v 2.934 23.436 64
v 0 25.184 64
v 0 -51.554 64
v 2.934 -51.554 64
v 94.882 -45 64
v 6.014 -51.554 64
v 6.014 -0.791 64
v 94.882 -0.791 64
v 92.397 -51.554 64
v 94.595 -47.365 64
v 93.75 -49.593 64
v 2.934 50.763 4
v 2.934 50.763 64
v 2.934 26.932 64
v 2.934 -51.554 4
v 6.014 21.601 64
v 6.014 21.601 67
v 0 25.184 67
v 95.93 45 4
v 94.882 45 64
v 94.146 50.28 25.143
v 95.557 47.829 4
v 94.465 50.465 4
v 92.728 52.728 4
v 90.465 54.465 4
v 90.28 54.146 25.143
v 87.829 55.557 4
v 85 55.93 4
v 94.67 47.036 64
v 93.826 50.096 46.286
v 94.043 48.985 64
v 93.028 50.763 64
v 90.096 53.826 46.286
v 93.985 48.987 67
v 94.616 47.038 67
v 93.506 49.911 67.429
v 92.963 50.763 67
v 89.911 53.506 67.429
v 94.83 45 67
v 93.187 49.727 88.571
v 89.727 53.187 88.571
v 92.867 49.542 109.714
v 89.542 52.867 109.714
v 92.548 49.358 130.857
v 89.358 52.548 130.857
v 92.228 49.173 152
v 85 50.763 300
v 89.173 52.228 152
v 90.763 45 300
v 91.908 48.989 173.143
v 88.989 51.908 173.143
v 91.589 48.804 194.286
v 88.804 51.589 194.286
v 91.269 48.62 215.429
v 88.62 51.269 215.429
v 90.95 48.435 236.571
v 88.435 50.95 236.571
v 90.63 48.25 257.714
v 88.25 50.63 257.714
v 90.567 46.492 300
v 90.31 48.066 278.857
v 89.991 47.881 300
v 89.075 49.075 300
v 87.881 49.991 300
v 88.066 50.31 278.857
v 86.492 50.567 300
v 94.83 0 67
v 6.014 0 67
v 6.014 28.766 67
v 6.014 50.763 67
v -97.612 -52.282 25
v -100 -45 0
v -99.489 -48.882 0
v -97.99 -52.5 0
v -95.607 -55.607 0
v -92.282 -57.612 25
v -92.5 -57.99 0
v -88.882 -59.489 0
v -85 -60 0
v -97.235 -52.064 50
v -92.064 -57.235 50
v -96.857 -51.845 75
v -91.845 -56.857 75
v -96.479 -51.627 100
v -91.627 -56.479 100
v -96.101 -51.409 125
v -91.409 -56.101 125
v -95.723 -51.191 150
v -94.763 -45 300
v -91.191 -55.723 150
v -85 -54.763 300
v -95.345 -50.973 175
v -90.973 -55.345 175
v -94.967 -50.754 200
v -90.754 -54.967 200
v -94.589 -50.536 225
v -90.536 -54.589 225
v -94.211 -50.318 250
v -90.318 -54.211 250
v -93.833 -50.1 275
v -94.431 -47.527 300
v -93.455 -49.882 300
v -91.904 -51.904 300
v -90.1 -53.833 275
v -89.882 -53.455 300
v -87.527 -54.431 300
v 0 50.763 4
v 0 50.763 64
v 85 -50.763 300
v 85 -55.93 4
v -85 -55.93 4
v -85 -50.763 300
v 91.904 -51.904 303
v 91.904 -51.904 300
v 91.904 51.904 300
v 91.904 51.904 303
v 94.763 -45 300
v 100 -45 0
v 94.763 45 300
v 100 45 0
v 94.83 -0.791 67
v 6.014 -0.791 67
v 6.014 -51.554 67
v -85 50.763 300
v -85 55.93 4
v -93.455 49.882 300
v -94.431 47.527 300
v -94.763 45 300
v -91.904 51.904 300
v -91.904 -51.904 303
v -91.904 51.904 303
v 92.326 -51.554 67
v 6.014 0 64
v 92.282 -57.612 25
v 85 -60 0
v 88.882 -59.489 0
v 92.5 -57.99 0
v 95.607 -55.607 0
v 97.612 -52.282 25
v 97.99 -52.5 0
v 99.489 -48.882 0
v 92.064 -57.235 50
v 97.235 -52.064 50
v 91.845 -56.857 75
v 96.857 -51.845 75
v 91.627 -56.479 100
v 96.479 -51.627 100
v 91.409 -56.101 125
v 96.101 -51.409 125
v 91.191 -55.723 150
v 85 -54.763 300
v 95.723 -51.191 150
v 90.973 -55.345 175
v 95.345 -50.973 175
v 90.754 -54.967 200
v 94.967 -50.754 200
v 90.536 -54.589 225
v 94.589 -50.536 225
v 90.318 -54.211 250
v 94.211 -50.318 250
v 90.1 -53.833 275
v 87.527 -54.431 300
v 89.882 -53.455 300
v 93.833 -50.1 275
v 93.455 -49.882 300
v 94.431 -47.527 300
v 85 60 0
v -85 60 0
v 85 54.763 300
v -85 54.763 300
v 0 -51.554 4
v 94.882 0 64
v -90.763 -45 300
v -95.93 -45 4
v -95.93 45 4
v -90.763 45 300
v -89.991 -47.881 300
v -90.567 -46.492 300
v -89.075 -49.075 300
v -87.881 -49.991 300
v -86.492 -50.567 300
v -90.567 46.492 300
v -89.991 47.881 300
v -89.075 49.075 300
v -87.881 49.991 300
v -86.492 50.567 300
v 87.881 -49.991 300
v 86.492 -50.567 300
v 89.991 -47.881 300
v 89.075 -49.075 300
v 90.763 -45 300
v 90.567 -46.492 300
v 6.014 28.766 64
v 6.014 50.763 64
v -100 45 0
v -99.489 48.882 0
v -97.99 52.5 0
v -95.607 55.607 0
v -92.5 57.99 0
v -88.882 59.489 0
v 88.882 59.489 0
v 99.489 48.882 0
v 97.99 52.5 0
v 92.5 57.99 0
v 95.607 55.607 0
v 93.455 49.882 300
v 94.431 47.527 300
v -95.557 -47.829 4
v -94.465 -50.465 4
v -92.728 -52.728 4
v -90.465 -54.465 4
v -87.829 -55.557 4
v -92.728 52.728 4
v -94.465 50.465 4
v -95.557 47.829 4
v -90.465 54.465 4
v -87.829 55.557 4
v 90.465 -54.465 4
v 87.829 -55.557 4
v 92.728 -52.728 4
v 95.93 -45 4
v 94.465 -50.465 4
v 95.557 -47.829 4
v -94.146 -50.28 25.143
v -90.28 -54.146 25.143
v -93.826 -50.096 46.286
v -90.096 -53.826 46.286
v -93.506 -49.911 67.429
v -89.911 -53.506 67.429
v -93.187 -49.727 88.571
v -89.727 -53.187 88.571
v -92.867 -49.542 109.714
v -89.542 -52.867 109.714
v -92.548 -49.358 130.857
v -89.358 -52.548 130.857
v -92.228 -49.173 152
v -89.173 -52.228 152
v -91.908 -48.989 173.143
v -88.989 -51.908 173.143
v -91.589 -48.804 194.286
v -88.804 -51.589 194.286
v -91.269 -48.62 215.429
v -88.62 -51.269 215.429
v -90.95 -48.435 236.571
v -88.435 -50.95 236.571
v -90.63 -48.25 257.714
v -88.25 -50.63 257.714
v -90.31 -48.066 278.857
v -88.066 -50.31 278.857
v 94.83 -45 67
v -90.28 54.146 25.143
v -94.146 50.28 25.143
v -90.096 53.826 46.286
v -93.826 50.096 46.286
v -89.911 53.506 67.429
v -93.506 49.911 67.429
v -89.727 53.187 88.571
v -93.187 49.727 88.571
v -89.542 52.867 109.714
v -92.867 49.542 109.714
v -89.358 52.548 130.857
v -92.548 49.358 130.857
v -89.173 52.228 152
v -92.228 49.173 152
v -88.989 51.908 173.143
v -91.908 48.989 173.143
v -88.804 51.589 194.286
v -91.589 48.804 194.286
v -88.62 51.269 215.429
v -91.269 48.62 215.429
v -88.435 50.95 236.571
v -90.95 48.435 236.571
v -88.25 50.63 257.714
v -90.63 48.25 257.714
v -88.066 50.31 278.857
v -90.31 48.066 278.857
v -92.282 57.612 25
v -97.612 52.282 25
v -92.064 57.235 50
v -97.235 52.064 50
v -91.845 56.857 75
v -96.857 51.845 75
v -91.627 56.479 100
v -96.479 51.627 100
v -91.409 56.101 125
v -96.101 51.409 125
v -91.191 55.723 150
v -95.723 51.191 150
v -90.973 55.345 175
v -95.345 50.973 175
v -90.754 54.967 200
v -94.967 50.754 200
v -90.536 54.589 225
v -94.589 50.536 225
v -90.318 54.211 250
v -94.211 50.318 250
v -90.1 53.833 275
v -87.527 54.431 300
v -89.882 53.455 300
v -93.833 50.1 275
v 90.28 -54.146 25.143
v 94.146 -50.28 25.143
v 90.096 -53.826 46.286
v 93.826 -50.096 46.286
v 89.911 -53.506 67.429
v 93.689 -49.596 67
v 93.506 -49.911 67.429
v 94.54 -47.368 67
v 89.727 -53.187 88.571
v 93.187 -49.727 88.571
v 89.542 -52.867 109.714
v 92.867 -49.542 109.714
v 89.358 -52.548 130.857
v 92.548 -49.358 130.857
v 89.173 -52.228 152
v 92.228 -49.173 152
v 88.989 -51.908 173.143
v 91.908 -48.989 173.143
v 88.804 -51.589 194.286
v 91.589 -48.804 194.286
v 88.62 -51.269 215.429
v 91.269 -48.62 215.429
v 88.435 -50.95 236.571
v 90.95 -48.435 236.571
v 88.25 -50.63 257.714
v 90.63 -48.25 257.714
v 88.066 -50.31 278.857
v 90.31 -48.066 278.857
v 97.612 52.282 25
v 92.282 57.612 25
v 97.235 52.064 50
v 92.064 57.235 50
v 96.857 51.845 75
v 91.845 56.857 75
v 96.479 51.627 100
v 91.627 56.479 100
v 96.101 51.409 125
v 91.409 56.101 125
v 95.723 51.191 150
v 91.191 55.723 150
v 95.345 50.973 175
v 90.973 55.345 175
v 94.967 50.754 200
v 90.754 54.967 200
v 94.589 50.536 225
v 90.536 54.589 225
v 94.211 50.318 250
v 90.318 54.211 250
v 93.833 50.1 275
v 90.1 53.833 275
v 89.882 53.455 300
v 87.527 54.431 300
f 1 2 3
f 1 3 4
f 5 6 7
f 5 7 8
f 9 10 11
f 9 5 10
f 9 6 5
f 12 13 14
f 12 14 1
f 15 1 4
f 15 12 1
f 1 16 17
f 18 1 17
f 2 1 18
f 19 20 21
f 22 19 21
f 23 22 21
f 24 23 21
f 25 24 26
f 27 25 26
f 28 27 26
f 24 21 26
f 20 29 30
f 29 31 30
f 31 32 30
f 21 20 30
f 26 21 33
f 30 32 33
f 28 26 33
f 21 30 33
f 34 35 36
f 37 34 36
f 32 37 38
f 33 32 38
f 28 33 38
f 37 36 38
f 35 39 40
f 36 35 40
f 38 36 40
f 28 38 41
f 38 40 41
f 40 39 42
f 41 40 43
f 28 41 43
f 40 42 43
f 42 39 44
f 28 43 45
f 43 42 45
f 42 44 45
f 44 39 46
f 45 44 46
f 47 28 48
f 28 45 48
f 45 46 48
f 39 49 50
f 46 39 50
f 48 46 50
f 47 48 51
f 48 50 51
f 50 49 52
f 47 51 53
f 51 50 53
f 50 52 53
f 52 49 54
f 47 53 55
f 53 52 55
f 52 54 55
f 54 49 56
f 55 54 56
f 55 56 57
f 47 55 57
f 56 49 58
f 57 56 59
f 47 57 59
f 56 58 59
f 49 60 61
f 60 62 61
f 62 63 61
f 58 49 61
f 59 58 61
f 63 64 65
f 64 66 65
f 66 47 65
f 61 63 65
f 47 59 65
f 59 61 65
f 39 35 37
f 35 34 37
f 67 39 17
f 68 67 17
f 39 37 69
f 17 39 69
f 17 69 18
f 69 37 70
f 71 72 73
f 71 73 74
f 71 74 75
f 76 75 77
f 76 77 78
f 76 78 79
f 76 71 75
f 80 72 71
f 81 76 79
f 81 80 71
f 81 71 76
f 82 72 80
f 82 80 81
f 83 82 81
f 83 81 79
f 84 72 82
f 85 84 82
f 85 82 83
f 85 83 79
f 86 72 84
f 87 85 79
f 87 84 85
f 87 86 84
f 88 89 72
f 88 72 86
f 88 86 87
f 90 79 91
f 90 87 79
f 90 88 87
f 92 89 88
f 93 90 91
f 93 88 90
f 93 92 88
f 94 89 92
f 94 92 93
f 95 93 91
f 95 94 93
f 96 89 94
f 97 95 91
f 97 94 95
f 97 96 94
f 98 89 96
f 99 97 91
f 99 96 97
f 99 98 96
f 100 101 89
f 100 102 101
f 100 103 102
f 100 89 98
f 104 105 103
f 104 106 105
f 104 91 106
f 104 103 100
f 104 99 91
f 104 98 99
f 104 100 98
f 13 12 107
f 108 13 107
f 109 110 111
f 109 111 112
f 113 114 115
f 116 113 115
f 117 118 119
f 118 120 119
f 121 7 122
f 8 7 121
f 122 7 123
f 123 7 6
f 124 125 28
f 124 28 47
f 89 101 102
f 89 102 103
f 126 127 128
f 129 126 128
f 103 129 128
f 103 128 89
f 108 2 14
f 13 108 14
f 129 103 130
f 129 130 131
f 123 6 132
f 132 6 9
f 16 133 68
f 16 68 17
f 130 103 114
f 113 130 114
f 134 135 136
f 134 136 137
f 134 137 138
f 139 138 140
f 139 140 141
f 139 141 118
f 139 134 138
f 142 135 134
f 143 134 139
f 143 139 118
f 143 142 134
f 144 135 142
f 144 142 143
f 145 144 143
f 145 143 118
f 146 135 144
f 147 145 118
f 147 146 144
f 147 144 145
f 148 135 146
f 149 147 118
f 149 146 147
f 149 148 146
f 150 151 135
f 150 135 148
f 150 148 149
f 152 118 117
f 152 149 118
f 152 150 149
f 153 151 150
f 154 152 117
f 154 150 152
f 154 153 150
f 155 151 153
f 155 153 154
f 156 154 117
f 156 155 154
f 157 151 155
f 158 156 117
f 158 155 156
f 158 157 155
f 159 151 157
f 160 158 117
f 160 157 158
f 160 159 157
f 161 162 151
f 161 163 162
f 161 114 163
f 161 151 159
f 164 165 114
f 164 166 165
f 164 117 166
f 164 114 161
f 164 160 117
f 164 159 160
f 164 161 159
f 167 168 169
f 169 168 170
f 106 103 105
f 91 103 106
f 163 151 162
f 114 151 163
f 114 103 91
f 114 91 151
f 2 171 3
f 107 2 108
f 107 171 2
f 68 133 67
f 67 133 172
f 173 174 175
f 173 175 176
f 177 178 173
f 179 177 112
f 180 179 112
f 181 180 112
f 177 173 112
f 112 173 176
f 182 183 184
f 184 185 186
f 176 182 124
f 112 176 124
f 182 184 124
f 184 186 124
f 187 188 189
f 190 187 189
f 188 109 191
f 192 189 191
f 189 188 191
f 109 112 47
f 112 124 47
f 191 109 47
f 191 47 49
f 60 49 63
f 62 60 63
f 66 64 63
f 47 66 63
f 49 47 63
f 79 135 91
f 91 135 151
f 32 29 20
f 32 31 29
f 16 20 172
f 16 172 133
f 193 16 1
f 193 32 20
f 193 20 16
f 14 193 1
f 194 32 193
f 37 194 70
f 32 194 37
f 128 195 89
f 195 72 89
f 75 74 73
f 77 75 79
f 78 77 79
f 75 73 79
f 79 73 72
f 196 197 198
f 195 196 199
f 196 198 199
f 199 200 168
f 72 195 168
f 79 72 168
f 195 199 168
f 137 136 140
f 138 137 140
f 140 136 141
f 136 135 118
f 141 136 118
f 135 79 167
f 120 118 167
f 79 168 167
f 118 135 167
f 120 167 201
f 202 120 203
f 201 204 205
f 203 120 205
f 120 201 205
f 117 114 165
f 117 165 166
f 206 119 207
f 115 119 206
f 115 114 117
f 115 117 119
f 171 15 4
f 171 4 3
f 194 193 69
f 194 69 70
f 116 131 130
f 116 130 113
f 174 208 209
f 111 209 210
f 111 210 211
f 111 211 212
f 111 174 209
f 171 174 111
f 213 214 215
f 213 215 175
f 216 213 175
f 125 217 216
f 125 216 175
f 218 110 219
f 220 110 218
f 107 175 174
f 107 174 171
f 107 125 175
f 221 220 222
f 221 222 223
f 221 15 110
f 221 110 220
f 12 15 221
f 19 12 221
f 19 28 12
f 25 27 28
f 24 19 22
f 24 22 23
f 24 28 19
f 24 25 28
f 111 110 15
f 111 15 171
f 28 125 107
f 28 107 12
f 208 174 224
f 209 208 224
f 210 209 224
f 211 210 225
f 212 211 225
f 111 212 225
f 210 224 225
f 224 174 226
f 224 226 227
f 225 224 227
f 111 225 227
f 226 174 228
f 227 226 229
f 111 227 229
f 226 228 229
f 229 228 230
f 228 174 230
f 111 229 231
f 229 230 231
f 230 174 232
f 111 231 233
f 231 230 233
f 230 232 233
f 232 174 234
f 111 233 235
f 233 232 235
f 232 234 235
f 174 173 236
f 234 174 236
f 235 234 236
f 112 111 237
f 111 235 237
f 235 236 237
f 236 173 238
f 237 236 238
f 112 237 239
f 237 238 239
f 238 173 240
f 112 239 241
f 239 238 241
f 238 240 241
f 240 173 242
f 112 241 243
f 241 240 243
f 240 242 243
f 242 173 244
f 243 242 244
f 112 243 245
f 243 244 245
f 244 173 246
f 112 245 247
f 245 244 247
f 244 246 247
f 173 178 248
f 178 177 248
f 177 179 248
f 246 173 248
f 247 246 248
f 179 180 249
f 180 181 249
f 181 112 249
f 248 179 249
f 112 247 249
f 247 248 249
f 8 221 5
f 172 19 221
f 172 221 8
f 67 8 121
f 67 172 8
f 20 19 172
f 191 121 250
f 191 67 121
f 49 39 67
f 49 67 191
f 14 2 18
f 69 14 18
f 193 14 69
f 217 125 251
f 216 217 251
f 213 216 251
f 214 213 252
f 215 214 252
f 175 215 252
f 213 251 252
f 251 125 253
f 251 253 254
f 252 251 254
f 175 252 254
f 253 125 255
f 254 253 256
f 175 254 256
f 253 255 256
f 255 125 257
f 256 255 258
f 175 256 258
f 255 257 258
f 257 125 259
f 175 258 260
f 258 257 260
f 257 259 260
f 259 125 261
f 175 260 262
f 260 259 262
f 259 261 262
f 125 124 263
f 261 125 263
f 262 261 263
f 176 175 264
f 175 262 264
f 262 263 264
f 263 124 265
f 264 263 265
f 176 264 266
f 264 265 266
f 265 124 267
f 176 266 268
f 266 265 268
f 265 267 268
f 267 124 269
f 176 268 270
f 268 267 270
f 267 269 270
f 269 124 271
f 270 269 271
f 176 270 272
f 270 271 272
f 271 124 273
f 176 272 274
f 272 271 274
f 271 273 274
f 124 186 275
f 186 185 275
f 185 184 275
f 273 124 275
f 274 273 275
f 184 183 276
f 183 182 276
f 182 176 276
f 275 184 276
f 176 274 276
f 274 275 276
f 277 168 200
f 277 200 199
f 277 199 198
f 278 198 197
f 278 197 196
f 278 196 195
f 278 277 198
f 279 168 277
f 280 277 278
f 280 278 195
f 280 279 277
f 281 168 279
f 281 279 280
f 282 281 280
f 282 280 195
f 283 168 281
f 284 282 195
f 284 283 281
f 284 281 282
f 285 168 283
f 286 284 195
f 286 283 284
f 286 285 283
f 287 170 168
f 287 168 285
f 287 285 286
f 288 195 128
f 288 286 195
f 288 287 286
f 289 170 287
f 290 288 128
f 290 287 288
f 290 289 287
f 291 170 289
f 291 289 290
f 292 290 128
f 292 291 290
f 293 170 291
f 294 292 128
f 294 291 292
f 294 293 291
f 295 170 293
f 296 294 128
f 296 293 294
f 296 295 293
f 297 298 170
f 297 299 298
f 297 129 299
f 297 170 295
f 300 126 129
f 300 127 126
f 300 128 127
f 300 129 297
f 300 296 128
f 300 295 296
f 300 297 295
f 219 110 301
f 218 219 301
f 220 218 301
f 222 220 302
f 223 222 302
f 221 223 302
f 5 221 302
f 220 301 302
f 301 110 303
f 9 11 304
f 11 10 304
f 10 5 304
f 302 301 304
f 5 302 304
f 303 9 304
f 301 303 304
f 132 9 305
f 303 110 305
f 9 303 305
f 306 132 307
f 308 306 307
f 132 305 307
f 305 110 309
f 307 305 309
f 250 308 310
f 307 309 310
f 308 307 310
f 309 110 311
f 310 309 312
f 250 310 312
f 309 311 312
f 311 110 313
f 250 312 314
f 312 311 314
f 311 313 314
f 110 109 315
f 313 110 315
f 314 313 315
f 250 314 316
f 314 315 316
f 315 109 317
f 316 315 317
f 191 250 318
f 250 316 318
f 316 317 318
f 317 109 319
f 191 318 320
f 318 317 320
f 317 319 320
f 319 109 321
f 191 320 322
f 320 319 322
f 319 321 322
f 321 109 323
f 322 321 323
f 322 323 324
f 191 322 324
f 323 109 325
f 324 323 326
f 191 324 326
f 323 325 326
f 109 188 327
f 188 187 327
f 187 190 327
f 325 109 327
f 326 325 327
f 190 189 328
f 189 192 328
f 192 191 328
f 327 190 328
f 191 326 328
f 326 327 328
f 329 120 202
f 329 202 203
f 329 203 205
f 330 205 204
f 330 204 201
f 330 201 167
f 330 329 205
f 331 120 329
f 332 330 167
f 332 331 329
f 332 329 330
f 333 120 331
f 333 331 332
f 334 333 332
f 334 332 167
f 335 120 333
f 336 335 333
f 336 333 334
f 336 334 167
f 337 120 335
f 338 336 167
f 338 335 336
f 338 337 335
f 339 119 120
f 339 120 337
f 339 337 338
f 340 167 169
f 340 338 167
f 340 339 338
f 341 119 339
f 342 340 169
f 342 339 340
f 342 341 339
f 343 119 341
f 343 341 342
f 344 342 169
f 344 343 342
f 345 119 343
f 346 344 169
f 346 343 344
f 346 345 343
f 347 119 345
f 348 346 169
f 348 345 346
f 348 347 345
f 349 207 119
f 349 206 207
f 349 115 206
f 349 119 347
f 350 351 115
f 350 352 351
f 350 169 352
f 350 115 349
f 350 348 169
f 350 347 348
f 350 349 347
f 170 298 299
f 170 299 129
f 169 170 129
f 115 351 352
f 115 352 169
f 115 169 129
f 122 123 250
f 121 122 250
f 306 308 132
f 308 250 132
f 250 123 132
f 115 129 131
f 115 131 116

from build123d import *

# Parameters (mm, degrees)
EXTRUDE_1_DEPTH  = 300
EXTRUDE_1_TAPER  = 1
SHELL_1_T        = -4
EXTRUDE_2_DEPTH  = 60
SKETCH_5_W       = 90.762871209
SKETCH_5_H       = 50.762871209
EXTRUDE_3_DEPTH  = 3
EXTRUDE_4_DEPTH  = 3
SKETCH_8_W       = 183.80764657
SKETCH_8_H       = 103.80764657
EXTRUDE_11_DEPTH = 3


with BuildPart() as part:
    # 草图1 → 凸台-拉伸1 (new body)
    with BuildSketch(Plane.XY):
        with BuildLine():
            ThreePointArc((-85, 60), (-95.606601718, 55.606601718), (-100, 45))
            Line((-100, 45), (-100, -45))
            ThreePointArc((-100, -45), (-95.606601718, -55.606601718), (-85, -60))
            Line((-85, -60), (85, -60))
            ThreePointArc((85, -60), (95.606601718, -55.606601718), (100, -45))
            Line((100, -45), (100, 45))
            ThreePointArc((100, 45), (95.606601718, 55.606601718), (85, 60))
            Line((85, 60), (-85, 60))
        make_face()
    extrude(amount=EXTRUDE_1_DEPTH, taper=EXTRUDE_1_TAPER)

    # 抽壳1
    shell_1_openings = [part.faces().sort_by_distance(p)[0] for p in [
        (0, 0, 300),
    ]]
    offset(amount=SHELL_1_T, openings=shell_1_openings, kind=Kind.INTERSECTION)

    # 草图4 → 凸台-拉伸2 (add)
    with BuildSketch(Plane.XY.offset(4)):
        Polygon((0, 0.466595392), (0, 0), (0, -0.395363651), (2.934231711, -0.395363651), (2.934231711, 0), (2.934231711, 50.762871209), (0, 50.762871209), align=None)
    extrude_2 = extrude(amount=EXTRUDE_2_DEPTH)

    # 草图5 → 凸台-拉伸3 (add)
    with BuildSketch(Plane(origin=(6.01372394, 0, 64), x_dir=(1, 0, 0), z_dir=(0, 0, 1))):
        with Locations((45.381435605, 25.381435605)):
            Rectangle(SKETCH_5_W, SKETCH_5_H)
    extrude_3 = extrude(amount=EXTRUDE_3_DEPTH)

    # 草图6 → 凸台-拉伸4 (add)
    with BuildSketch(Plane.XY.offset(64)):
        Polygon((0, 25.183753779), (6.01372394, 28.76636796), (6.01372394, 21.601139598), align=None)
    extrude(amount=EXTRUDE_4_DEPTH)

    # 镜向1: 凸台-拉伸2, 凸台-拉伸3 across plane
    add(extrude_2.mirror(Plane(origin=(0, -0.395363651, 64), x_dir=(0, 0, 1), z_dir=(0, -1, 0))))
    add(extrude_3.mirror(Plane(origin=(0, -0.395363651, 64), x_dir=(0, 0, 1), z_dir=(0, -1, 0))))

    # 草图8 → 凸台-拉伸11 (add)
    with BuildSketch(Plane.XY.offset(300)):
        Rectangle(SKETCH_8_W, SKETCH_8_H)
    extrude(amount=EXTRUDE_11_DEPTH)


solid = part.part
